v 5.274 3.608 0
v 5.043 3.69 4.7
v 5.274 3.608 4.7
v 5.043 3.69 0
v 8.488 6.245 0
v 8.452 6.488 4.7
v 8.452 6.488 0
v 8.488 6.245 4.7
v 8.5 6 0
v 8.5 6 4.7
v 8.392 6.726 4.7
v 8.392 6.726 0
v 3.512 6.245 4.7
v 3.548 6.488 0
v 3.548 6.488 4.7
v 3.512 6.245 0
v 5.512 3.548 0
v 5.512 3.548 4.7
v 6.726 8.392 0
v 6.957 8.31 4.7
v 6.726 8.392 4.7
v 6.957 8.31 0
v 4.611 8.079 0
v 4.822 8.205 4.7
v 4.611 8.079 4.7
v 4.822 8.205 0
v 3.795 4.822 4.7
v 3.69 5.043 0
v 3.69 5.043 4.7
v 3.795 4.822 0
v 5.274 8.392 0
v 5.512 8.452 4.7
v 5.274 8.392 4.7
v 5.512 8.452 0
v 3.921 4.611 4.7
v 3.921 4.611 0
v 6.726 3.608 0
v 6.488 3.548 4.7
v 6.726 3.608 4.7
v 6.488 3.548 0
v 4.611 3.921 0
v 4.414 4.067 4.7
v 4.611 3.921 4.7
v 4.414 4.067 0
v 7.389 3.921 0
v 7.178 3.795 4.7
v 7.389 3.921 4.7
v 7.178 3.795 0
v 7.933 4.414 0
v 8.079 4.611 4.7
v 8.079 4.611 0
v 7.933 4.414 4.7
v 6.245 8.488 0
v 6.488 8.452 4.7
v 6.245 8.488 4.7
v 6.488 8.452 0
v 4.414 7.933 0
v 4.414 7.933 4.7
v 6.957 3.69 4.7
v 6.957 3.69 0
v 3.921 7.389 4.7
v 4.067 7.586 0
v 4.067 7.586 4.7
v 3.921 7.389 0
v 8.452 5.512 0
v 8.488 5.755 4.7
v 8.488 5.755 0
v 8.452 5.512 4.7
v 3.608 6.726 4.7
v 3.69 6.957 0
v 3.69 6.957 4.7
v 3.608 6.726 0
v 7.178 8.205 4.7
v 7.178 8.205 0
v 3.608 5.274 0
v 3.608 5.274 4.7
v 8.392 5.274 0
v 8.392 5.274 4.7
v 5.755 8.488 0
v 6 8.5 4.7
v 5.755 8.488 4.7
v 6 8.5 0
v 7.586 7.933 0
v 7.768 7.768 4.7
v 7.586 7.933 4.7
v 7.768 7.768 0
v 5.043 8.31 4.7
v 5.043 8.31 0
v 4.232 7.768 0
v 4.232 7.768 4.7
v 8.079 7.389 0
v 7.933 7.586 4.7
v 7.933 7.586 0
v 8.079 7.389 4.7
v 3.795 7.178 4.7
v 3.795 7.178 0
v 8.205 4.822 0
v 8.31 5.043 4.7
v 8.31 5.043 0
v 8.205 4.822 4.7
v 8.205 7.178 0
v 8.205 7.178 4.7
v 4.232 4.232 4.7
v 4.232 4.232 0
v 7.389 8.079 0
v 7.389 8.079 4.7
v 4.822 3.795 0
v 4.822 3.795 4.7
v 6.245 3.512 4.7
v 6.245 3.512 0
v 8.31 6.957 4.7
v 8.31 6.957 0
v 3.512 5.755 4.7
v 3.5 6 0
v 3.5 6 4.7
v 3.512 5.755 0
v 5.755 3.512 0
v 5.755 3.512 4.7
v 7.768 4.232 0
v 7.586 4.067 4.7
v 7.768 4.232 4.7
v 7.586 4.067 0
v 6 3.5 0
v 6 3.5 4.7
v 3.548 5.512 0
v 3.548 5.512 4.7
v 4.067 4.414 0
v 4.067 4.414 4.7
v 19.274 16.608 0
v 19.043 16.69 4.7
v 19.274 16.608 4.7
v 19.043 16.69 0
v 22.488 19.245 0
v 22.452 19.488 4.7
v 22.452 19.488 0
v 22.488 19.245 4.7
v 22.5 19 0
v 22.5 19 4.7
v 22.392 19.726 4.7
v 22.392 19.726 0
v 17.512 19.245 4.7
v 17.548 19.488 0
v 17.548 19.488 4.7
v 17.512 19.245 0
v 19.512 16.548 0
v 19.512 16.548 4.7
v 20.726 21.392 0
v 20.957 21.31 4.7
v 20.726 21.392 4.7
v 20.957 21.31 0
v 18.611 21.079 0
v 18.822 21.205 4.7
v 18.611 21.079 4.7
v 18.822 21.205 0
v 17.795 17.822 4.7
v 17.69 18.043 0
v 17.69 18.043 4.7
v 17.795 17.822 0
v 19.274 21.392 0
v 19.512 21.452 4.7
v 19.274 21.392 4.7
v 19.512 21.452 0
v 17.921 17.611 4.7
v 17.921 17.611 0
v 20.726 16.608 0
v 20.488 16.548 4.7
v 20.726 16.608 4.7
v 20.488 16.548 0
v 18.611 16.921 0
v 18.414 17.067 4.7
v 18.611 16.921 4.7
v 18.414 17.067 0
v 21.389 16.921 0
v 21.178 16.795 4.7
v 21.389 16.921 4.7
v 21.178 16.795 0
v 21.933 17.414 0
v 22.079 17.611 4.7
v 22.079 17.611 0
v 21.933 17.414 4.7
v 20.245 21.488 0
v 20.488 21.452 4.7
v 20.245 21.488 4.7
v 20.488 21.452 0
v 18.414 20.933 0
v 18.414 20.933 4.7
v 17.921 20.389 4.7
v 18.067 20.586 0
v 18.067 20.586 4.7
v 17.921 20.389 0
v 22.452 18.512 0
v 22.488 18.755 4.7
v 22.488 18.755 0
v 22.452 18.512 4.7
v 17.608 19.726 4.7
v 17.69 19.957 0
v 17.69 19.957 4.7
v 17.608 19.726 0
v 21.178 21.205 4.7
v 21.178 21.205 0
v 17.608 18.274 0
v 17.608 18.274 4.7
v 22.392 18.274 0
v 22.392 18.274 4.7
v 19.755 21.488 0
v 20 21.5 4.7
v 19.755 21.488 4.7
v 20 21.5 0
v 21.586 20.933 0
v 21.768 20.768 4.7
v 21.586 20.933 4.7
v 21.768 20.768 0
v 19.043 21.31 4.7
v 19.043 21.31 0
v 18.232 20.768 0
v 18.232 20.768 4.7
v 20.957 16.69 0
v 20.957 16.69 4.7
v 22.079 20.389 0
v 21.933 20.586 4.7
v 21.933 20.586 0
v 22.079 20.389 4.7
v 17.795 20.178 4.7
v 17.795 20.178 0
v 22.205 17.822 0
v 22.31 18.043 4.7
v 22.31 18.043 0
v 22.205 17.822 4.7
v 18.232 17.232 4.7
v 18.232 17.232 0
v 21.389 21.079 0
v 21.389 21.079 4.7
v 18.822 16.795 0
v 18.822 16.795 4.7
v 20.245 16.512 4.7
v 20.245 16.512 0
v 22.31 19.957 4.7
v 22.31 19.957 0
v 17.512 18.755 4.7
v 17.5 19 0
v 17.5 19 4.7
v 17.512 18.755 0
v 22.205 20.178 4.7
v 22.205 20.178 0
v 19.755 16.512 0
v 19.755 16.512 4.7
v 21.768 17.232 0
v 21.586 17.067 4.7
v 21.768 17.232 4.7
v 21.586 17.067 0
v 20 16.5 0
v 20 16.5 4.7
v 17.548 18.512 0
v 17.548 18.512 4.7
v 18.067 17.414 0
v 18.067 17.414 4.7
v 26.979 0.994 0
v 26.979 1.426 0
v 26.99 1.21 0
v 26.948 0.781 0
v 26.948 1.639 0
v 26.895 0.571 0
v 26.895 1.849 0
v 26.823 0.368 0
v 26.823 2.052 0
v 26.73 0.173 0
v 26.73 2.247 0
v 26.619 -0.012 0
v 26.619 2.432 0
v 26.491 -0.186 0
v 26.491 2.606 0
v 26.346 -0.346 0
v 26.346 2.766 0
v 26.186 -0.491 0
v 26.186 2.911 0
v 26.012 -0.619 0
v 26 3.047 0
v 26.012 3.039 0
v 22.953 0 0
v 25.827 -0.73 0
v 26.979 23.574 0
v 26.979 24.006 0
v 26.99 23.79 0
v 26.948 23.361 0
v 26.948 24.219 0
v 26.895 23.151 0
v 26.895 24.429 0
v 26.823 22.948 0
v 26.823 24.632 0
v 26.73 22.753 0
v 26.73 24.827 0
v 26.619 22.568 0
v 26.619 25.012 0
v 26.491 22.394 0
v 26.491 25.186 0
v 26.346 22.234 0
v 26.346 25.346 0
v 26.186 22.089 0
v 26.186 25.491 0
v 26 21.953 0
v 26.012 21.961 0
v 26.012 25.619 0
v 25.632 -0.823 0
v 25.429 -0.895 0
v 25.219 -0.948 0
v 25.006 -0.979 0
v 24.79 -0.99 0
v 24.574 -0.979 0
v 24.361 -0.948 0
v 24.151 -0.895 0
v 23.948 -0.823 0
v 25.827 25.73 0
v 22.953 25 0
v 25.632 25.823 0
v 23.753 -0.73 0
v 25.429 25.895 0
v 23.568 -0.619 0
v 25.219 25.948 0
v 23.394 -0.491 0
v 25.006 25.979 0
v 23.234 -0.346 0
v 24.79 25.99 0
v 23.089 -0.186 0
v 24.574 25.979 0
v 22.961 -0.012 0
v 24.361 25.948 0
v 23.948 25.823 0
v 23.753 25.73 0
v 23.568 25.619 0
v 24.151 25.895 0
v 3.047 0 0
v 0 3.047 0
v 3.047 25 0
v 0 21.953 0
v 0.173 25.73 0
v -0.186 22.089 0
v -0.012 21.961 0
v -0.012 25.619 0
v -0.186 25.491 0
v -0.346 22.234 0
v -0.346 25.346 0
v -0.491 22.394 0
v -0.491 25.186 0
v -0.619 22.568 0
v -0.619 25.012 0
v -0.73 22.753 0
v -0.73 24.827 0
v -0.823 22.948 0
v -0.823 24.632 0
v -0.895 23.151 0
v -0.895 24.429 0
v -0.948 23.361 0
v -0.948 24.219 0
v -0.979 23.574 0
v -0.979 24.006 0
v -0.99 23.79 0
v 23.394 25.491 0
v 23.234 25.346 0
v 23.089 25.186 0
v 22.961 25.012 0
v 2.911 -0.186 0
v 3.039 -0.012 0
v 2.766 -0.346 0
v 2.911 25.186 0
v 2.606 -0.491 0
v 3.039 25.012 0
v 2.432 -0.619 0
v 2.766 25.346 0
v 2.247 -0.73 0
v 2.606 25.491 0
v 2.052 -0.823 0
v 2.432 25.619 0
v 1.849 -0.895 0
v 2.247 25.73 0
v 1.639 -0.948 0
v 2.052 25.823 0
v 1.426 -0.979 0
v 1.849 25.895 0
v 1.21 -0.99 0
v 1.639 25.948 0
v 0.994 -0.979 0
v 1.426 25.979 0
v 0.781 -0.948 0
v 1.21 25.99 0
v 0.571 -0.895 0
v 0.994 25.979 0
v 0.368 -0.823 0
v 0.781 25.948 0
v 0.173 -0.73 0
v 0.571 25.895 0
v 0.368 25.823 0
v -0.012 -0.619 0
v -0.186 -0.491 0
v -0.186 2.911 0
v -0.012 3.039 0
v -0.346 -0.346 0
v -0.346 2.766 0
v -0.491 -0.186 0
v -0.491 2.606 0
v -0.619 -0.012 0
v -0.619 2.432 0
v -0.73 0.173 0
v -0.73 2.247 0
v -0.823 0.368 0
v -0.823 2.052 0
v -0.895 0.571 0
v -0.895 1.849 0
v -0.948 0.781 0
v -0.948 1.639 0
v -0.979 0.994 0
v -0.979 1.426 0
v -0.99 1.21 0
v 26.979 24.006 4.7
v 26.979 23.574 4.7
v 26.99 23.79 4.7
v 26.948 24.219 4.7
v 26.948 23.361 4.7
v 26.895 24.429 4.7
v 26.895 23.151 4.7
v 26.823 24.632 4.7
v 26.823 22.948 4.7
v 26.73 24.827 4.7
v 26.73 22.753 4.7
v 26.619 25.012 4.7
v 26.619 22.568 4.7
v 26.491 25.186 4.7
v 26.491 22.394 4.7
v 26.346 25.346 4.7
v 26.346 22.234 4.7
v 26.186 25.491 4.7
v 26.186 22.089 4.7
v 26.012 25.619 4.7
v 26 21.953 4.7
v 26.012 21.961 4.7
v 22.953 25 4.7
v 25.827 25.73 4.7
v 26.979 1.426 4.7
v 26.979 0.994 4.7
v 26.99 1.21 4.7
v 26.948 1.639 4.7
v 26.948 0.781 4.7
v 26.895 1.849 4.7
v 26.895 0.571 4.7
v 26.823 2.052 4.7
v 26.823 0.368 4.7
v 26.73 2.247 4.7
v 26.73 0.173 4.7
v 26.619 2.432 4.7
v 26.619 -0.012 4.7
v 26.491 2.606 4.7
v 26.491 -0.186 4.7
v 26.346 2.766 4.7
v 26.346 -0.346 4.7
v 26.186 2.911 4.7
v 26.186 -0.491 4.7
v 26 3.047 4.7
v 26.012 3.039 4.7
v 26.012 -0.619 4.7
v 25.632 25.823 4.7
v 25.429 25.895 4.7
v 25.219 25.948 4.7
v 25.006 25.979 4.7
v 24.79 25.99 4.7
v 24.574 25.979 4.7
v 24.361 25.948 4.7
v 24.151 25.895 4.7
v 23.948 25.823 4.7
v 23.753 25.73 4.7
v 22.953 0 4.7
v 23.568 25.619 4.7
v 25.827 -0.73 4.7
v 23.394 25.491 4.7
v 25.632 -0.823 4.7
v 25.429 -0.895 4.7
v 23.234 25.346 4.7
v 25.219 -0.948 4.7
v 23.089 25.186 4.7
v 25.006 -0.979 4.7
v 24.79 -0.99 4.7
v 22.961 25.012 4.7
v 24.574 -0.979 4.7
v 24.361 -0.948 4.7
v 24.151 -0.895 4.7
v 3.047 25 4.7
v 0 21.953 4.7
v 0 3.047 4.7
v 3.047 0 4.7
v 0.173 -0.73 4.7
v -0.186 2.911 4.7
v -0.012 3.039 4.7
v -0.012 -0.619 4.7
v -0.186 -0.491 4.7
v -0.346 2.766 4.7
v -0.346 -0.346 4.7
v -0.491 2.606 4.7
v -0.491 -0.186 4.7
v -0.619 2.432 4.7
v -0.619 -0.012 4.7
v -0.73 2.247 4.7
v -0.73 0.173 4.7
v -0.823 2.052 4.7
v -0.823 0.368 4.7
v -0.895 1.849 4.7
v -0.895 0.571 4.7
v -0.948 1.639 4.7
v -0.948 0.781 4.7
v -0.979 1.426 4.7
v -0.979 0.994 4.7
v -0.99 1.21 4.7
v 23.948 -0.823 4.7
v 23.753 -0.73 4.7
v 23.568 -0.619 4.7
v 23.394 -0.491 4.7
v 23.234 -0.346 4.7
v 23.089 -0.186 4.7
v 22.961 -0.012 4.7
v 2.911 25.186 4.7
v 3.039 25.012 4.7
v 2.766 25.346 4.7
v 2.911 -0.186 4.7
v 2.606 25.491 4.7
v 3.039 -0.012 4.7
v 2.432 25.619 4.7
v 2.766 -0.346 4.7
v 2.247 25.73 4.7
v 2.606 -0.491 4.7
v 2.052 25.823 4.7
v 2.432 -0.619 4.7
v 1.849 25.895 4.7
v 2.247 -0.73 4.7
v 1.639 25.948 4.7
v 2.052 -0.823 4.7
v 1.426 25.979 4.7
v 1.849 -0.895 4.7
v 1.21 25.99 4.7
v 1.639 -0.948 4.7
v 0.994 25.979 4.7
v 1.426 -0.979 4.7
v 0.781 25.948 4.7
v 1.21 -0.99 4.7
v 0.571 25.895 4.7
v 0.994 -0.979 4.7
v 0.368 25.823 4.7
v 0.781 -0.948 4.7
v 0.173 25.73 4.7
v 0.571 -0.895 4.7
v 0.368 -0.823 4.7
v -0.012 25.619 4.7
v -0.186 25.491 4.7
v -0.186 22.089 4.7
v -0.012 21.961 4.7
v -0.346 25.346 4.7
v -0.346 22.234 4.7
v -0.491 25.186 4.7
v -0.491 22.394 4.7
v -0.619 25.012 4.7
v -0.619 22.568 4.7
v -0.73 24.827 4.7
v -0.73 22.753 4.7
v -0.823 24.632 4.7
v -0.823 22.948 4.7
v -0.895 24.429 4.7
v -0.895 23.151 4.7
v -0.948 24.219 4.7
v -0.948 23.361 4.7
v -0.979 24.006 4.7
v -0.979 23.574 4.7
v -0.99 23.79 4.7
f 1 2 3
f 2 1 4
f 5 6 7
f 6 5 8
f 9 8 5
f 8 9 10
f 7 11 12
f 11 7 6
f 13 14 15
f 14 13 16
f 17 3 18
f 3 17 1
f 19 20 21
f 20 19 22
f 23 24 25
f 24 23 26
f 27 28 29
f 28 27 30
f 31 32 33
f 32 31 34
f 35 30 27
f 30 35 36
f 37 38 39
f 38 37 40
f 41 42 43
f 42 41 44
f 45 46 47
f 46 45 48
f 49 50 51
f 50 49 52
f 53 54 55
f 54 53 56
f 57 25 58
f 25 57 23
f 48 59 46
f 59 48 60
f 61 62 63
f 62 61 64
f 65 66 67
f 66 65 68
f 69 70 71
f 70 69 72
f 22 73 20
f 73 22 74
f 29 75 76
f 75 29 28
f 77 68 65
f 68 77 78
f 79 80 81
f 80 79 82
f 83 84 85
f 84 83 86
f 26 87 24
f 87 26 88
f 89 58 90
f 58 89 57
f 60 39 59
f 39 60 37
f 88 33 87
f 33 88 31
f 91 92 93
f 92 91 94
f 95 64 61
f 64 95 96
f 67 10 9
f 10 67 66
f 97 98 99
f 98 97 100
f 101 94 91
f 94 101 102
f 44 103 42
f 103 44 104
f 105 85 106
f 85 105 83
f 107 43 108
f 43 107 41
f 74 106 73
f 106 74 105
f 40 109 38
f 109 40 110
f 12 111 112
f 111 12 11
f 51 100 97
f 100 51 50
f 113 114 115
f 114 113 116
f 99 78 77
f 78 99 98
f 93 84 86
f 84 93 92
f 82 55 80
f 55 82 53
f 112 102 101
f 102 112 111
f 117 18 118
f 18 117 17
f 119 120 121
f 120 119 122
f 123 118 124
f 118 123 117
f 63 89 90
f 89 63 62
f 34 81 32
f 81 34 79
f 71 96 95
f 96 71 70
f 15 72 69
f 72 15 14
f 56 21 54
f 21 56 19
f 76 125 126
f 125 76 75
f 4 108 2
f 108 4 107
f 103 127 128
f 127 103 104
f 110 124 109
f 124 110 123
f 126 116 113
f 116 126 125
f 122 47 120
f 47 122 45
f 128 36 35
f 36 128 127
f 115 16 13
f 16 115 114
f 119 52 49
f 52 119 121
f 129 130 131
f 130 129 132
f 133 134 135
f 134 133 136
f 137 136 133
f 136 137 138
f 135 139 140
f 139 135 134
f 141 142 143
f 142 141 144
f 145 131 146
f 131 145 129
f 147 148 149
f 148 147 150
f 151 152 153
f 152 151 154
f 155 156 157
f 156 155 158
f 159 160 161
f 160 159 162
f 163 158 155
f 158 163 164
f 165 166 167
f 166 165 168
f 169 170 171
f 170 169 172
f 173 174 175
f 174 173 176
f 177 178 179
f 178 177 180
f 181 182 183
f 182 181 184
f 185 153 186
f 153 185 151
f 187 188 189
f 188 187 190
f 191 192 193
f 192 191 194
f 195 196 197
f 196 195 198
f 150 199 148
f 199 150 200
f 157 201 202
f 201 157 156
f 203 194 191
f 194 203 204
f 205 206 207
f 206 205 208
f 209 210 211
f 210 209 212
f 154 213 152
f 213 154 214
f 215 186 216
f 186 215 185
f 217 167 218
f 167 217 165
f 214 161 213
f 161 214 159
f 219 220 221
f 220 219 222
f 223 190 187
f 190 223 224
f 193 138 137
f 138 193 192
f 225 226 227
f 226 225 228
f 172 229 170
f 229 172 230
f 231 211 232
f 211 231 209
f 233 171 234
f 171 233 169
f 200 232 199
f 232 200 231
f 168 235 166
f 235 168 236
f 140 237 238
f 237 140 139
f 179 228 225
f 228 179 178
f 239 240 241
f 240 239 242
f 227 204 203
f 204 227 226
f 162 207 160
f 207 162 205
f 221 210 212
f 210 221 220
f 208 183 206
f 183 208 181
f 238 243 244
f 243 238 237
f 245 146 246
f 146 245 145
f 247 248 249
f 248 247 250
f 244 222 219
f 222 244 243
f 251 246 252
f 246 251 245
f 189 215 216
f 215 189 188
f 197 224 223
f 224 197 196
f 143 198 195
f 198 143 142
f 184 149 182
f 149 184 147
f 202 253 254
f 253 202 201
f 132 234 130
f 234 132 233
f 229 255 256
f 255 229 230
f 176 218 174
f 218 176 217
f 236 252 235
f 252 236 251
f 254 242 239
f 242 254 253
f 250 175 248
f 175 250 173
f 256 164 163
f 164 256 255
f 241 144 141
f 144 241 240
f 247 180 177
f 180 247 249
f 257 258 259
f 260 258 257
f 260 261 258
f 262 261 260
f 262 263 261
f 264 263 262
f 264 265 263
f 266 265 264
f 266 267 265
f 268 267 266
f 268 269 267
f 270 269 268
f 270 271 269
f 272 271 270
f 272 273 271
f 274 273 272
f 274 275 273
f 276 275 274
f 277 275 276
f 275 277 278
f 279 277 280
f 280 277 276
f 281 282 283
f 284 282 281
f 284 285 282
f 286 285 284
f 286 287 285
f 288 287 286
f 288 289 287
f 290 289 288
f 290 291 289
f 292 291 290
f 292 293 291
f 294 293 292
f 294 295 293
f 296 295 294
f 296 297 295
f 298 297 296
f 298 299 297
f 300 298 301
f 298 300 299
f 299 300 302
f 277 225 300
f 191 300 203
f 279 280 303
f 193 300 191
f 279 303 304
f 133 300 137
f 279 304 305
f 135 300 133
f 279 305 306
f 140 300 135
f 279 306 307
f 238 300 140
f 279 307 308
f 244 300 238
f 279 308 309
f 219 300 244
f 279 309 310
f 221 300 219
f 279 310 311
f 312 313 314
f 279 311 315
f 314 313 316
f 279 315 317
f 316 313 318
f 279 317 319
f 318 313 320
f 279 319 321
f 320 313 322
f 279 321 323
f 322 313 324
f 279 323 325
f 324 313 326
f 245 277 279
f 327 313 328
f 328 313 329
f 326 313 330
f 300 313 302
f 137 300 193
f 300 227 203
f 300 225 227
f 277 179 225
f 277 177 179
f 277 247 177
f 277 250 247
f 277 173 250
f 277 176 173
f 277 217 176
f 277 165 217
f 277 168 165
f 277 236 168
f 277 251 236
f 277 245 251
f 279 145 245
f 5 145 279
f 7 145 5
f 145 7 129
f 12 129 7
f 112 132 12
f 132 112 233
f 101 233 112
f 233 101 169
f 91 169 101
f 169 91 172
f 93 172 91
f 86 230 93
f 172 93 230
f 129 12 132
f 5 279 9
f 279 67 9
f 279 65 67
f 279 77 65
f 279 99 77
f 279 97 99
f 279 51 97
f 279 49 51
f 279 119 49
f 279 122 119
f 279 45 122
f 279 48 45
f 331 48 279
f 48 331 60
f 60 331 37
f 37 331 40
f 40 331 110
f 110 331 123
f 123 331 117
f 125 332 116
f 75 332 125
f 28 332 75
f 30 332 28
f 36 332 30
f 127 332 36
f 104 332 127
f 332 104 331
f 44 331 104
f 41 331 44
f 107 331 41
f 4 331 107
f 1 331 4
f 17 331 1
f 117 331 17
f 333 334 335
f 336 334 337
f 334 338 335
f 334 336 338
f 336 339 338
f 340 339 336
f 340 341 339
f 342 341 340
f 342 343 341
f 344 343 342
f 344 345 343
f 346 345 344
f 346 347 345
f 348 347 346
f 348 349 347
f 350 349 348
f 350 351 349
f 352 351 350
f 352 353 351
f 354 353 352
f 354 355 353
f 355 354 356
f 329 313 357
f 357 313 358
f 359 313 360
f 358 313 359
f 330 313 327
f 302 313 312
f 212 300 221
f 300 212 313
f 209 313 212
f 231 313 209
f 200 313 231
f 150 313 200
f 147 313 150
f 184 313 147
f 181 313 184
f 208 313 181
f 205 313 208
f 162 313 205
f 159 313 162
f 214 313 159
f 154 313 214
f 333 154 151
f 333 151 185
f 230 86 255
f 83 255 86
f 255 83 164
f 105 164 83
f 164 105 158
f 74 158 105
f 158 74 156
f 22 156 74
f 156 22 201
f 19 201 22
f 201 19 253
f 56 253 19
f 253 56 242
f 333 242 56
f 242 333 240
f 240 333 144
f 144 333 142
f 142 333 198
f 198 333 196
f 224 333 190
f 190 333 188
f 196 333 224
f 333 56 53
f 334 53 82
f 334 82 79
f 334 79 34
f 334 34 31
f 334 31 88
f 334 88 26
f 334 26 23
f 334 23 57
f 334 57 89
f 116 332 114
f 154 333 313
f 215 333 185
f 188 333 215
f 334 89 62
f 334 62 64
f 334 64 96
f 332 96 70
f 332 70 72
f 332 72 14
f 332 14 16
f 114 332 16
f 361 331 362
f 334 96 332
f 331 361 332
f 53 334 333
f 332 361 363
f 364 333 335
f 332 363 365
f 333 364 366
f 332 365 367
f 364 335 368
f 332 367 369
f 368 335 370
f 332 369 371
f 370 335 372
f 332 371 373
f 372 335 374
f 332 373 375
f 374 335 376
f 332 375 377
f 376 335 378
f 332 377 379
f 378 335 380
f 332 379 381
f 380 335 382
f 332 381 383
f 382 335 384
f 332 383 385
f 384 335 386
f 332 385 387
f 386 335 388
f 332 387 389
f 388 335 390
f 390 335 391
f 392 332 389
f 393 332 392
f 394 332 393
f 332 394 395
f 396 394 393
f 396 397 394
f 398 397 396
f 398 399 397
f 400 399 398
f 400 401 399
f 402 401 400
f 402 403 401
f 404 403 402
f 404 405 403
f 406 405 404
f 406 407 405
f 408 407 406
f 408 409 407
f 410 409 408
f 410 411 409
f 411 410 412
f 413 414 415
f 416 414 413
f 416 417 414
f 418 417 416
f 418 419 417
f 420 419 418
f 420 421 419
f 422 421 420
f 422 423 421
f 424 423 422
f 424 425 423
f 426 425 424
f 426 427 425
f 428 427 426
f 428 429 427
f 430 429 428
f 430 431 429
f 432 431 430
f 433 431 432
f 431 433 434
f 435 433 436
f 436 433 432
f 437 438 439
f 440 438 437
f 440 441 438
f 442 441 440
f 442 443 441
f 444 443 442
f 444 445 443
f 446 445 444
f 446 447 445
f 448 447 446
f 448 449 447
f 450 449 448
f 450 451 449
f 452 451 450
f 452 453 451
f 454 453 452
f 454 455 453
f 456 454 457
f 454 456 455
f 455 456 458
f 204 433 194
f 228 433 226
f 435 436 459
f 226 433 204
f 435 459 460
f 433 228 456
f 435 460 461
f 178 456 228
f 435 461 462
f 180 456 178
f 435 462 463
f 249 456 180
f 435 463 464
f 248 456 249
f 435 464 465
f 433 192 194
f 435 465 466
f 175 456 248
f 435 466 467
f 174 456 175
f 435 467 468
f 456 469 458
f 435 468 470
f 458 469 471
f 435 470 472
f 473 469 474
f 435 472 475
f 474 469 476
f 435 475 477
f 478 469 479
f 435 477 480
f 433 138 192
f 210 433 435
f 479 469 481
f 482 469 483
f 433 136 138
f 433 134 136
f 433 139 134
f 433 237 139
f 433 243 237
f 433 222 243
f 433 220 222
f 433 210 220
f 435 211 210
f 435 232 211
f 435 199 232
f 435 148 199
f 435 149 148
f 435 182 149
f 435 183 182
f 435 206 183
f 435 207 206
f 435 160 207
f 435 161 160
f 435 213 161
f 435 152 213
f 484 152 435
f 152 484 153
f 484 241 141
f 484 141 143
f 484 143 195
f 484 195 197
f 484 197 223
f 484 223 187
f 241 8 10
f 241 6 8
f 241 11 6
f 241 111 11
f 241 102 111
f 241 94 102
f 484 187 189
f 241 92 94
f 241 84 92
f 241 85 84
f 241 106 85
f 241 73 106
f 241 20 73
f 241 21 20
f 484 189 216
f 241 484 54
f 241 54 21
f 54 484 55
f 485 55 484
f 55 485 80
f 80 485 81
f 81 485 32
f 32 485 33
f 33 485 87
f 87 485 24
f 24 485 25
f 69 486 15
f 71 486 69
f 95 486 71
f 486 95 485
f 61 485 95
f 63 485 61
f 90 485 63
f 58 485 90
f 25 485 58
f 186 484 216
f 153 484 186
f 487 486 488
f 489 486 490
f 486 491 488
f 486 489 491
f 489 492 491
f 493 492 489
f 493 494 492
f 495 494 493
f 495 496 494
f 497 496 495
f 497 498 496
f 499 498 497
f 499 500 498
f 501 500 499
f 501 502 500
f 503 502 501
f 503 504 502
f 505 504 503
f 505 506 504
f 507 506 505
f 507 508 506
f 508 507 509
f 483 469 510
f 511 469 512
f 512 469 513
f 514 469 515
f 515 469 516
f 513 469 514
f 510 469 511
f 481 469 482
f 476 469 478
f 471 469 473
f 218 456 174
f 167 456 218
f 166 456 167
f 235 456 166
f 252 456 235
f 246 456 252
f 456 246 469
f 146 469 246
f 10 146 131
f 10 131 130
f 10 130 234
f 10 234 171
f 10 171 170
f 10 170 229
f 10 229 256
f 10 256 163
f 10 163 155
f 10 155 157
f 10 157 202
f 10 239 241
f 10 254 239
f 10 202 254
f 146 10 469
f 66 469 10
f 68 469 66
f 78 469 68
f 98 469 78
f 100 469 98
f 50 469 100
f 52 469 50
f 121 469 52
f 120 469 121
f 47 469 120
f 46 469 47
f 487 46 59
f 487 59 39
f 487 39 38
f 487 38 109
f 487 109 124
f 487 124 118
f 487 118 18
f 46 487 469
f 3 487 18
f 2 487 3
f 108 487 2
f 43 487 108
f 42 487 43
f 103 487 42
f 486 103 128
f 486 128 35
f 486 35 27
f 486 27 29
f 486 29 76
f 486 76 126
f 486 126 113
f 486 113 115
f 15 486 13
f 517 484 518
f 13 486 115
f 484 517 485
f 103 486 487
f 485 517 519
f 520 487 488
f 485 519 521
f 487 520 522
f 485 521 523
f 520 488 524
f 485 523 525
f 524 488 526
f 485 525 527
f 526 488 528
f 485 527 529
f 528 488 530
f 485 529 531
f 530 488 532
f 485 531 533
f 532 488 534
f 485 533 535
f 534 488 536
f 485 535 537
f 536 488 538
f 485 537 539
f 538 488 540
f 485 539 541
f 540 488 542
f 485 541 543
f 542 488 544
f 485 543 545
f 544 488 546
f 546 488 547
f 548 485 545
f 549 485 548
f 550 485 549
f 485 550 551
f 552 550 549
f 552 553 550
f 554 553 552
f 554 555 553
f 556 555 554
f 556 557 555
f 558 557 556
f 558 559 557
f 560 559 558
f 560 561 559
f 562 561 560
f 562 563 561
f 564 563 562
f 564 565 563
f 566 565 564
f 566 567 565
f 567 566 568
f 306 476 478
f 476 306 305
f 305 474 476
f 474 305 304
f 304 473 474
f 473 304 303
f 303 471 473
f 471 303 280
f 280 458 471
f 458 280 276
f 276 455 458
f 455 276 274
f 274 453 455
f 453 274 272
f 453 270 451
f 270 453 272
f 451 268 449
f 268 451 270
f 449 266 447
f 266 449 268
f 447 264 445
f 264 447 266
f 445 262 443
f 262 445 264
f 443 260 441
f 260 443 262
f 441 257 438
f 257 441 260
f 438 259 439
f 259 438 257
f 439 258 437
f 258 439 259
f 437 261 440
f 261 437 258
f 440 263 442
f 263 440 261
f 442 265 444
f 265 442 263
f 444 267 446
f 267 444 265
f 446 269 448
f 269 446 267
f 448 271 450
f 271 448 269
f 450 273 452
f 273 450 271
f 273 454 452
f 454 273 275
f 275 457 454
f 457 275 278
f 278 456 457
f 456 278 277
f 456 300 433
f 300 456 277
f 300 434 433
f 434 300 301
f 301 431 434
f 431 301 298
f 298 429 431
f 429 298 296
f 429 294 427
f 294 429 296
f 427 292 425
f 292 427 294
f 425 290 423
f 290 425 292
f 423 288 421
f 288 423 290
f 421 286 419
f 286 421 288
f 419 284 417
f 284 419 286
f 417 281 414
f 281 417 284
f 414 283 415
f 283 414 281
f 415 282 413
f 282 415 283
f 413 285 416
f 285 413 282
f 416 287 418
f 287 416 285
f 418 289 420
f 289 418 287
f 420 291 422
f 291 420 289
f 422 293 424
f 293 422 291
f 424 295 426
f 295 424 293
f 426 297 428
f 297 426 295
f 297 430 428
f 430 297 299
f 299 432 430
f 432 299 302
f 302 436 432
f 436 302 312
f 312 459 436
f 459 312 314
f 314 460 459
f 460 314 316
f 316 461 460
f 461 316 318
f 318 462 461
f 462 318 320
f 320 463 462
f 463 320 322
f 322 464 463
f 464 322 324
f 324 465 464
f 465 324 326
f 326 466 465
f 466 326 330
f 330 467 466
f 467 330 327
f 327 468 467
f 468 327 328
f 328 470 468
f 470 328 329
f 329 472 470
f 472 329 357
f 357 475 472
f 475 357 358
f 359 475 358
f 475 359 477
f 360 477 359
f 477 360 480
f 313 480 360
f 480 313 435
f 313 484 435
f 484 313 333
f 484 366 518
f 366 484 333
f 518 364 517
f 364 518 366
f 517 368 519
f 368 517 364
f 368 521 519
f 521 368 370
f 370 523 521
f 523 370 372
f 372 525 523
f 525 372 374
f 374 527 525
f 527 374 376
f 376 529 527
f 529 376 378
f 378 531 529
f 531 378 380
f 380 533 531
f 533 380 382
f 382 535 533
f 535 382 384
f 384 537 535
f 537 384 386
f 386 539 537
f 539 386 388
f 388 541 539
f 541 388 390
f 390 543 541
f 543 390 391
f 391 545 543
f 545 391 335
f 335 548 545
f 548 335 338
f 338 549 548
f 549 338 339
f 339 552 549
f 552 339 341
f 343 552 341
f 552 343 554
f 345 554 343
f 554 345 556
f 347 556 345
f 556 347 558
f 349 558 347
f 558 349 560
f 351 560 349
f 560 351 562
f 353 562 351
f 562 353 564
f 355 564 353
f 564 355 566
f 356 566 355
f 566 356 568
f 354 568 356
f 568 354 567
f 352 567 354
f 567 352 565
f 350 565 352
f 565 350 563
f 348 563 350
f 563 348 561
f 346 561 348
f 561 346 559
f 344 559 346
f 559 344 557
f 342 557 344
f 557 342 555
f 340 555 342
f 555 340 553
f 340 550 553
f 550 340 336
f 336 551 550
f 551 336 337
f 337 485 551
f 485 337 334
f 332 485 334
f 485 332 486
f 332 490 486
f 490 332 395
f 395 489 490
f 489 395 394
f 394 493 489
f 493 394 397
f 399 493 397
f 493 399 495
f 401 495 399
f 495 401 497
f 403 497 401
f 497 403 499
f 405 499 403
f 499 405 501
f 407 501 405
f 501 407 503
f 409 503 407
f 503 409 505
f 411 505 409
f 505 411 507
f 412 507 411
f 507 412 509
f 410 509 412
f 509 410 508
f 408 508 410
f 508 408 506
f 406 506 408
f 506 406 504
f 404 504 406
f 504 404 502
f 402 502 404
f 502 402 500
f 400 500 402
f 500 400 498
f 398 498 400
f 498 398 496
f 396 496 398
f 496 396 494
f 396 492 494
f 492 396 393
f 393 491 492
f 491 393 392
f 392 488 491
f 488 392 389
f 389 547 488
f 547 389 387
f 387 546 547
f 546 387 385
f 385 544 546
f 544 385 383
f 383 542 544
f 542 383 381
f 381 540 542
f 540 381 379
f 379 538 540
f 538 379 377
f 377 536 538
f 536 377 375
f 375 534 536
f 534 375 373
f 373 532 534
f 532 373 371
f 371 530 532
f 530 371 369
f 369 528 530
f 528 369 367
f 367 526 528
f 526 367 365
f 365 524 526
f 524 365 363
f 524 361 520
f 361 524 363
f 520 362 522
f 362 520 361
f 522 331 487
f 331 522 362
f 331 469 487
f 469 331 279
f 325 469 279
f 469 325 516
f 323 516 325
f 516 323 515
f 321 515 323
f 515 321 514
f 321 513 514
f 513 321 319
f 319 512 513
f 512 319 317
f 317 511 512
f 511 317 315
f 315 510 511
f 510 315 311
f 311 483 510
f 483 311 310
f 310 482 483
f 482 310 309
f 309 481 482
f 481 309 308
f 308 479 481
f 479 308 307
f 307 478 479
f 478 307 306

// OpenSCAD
$fn = 64;

// Target overall size (X,Y,Z)
bracket_length    = 26;
bracket_width     = 25;
bracket_thickness = 4.7;

// Corner "ears"/bumps seen in reference silhouettes
ear_r = 2.2;                 // radius of corner bump
ear_inset = ear_r * 0.55;    // how far the bump center sits inside the plate

// Mounting holes (through thickness)
hole_d = 5;
hole_r = hole_d/2;

// Hole placement (formulas from dimensions)
edge_margin_x = 6;
edge_margin_y = 6;

// Small overlap to ensure robust booleans
eps = 0.02;

module plate_with_corner_ears_2d(L, W, r, inset) {
    // Base rectangle plus 4 quarter-circle bumps at corners
    union() {
        square([L, W], center=false);

        // bottom-left
        translate([inset, inset]) circle(r=r);
        // bottom-right
        translate([L - inset, inset]) circle(r=r);
        // top-left
        translate([inset, W - inset]) circle(r=r);
        // top-right
        translate([L - inset, W - inset]) circle(r=r);
    }
}

module extrusion_bracket() {
    difference() {
        // Solid plate (one connected body)
        linear_extrude(height=bracket_thickness, center=false)
            plate_with_corner_ears_2d(bracket_length, bracket_width, ear_r, ear_inset);

        // Two through-holes (typical extrusion bracket)
        for (p = [
            [edge_margin_x, edge_margin_y],
            [bracket_length - edge_margin_x, bracket_width - edge_margin_y]
        ]) {
            translate([p[0], p[1], -eps])
                cylinder(h=bracket_thickness + 2*eps, r=hole_r, center=false);
        }
    }
}

extrusion_bracket();
